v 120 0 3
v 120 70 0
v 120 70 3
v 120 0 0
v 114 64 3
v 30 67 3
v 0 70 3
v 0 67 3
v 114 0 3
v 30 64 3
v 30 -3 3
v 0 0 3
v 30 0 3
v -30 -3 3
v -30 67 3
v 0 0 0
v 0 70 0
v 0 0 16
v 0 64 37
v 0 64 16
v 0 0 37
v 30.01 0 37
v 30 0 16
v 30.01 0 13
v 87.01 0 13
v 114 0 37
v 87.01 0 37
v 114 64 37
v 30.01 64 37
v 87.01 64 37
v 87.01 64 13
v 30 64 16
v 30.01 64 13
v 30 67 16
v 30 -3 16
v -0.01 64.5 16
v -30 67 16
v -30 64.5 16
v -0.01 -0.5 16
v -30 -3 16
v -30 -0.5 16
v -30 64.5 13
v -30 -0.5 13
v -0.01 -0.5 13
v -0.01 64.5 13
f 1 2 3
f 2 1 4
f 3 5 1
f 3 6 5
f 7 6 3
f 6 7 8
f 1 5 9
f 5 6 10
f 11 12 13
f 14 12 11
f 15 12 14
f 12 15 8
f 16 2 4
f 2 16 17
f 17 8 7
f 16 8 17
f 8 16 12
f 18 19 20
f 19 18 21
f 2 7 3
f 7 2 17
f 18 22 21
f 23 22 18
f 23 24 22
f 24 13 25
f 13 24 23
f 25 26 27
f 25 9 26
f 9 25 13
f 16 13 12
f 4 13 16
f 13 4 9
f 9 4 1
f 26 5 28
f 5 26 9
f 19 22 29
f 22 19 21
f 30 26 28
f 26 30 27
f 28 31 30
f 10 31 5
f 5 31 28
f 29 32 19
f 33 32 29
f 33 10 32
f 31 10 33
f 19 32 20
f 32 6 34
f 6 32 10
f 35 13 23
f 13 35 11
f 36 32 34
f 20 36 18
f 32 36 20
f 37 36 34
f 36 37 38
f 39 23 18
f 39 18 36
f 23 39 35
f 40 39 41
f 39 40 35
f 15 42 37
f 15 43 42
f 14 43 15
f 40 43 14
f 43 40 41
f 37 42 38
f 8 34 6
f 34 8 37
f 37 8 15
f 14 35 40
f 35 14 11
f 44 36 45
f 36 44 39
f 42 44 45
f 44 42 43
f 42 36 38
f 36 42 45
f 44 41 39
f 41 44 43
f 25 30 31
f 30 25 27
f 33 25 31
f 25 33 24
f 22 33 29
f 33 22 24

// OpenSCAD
// Buffer tank for mini horizontal gel electrophoresis
// Units: mm. Tank rests on XY plane (z = 0), builds upward.

$fn = 96;

// ---- Tank ----
tank_x      = 120;   // outer length (X)
tank_y      = 70;    // outer width (Y)
tank_h      = 40;    // outer height (Z)
wall        = 3;     // wall thickness
floor_t     = 3;     // floor thickness

// ---- Platform ----
plat_x      = 60;    // platform length in X (centred)
plat_top_z  = 13;    // platform top height above inner floor (z = 13)

// ---- Electrode holes ----
hole_d      = 2;     // electrode hole diameter
hole_y      = 0;     // electrode hole Y position
hole_z      = 30;    // electrode hole Z position

// ---- Misc ----
eps         = 0.5;   // cutter overshoot past faces

// Inner dimensions
inner_x = tank_x - 2 * wall;
inner_y = tank_y - 2 * wall;
inner_h = tank_h - floor_t;

// Platform legs extend into the buffer chambers
leg_x = (inner_x - plat_x) / 2 + wall;

difference() {
    union() {
        // Tank body
        cube([tank_x, tank_y, floor_t]);
        cube([inner_x, inner_y, inner_h]);
        // Raised platform
        translate([-plat_x / 2, -wall, floor_t])
            cube([plat_x, tank_y, plat_top_z]);
    }

    // Door-like bridge across each end, above the platform,
    // leaving the two buffer chambers connected
    translate([-inner_x / 2 - 0.01, -eps, plat_top_z])
        cube([inner_x / 2, inner_y + 2 * eps, tank_h - floor_t]);
    translate([plat_x / 2 + 0.01, -eps, plat_top_z])
        cube([inner_x / 2, inner_y + 2 * eps, tank_h - floor_t]);

    // Horizontal electrode holes through each end wall
    translate([-tank_x / 2, hole_y, hole_z])
        rotate([-90, 0, 0]) cylinder(d = hole_d, h = tank_y + 2 * eps);
    translate([tank_x / 2, hole_y, hole_z])
        rotate([-90, 0, 0]) cylinder(d = hole_d, h = tank_y + 2 * eps);
}
